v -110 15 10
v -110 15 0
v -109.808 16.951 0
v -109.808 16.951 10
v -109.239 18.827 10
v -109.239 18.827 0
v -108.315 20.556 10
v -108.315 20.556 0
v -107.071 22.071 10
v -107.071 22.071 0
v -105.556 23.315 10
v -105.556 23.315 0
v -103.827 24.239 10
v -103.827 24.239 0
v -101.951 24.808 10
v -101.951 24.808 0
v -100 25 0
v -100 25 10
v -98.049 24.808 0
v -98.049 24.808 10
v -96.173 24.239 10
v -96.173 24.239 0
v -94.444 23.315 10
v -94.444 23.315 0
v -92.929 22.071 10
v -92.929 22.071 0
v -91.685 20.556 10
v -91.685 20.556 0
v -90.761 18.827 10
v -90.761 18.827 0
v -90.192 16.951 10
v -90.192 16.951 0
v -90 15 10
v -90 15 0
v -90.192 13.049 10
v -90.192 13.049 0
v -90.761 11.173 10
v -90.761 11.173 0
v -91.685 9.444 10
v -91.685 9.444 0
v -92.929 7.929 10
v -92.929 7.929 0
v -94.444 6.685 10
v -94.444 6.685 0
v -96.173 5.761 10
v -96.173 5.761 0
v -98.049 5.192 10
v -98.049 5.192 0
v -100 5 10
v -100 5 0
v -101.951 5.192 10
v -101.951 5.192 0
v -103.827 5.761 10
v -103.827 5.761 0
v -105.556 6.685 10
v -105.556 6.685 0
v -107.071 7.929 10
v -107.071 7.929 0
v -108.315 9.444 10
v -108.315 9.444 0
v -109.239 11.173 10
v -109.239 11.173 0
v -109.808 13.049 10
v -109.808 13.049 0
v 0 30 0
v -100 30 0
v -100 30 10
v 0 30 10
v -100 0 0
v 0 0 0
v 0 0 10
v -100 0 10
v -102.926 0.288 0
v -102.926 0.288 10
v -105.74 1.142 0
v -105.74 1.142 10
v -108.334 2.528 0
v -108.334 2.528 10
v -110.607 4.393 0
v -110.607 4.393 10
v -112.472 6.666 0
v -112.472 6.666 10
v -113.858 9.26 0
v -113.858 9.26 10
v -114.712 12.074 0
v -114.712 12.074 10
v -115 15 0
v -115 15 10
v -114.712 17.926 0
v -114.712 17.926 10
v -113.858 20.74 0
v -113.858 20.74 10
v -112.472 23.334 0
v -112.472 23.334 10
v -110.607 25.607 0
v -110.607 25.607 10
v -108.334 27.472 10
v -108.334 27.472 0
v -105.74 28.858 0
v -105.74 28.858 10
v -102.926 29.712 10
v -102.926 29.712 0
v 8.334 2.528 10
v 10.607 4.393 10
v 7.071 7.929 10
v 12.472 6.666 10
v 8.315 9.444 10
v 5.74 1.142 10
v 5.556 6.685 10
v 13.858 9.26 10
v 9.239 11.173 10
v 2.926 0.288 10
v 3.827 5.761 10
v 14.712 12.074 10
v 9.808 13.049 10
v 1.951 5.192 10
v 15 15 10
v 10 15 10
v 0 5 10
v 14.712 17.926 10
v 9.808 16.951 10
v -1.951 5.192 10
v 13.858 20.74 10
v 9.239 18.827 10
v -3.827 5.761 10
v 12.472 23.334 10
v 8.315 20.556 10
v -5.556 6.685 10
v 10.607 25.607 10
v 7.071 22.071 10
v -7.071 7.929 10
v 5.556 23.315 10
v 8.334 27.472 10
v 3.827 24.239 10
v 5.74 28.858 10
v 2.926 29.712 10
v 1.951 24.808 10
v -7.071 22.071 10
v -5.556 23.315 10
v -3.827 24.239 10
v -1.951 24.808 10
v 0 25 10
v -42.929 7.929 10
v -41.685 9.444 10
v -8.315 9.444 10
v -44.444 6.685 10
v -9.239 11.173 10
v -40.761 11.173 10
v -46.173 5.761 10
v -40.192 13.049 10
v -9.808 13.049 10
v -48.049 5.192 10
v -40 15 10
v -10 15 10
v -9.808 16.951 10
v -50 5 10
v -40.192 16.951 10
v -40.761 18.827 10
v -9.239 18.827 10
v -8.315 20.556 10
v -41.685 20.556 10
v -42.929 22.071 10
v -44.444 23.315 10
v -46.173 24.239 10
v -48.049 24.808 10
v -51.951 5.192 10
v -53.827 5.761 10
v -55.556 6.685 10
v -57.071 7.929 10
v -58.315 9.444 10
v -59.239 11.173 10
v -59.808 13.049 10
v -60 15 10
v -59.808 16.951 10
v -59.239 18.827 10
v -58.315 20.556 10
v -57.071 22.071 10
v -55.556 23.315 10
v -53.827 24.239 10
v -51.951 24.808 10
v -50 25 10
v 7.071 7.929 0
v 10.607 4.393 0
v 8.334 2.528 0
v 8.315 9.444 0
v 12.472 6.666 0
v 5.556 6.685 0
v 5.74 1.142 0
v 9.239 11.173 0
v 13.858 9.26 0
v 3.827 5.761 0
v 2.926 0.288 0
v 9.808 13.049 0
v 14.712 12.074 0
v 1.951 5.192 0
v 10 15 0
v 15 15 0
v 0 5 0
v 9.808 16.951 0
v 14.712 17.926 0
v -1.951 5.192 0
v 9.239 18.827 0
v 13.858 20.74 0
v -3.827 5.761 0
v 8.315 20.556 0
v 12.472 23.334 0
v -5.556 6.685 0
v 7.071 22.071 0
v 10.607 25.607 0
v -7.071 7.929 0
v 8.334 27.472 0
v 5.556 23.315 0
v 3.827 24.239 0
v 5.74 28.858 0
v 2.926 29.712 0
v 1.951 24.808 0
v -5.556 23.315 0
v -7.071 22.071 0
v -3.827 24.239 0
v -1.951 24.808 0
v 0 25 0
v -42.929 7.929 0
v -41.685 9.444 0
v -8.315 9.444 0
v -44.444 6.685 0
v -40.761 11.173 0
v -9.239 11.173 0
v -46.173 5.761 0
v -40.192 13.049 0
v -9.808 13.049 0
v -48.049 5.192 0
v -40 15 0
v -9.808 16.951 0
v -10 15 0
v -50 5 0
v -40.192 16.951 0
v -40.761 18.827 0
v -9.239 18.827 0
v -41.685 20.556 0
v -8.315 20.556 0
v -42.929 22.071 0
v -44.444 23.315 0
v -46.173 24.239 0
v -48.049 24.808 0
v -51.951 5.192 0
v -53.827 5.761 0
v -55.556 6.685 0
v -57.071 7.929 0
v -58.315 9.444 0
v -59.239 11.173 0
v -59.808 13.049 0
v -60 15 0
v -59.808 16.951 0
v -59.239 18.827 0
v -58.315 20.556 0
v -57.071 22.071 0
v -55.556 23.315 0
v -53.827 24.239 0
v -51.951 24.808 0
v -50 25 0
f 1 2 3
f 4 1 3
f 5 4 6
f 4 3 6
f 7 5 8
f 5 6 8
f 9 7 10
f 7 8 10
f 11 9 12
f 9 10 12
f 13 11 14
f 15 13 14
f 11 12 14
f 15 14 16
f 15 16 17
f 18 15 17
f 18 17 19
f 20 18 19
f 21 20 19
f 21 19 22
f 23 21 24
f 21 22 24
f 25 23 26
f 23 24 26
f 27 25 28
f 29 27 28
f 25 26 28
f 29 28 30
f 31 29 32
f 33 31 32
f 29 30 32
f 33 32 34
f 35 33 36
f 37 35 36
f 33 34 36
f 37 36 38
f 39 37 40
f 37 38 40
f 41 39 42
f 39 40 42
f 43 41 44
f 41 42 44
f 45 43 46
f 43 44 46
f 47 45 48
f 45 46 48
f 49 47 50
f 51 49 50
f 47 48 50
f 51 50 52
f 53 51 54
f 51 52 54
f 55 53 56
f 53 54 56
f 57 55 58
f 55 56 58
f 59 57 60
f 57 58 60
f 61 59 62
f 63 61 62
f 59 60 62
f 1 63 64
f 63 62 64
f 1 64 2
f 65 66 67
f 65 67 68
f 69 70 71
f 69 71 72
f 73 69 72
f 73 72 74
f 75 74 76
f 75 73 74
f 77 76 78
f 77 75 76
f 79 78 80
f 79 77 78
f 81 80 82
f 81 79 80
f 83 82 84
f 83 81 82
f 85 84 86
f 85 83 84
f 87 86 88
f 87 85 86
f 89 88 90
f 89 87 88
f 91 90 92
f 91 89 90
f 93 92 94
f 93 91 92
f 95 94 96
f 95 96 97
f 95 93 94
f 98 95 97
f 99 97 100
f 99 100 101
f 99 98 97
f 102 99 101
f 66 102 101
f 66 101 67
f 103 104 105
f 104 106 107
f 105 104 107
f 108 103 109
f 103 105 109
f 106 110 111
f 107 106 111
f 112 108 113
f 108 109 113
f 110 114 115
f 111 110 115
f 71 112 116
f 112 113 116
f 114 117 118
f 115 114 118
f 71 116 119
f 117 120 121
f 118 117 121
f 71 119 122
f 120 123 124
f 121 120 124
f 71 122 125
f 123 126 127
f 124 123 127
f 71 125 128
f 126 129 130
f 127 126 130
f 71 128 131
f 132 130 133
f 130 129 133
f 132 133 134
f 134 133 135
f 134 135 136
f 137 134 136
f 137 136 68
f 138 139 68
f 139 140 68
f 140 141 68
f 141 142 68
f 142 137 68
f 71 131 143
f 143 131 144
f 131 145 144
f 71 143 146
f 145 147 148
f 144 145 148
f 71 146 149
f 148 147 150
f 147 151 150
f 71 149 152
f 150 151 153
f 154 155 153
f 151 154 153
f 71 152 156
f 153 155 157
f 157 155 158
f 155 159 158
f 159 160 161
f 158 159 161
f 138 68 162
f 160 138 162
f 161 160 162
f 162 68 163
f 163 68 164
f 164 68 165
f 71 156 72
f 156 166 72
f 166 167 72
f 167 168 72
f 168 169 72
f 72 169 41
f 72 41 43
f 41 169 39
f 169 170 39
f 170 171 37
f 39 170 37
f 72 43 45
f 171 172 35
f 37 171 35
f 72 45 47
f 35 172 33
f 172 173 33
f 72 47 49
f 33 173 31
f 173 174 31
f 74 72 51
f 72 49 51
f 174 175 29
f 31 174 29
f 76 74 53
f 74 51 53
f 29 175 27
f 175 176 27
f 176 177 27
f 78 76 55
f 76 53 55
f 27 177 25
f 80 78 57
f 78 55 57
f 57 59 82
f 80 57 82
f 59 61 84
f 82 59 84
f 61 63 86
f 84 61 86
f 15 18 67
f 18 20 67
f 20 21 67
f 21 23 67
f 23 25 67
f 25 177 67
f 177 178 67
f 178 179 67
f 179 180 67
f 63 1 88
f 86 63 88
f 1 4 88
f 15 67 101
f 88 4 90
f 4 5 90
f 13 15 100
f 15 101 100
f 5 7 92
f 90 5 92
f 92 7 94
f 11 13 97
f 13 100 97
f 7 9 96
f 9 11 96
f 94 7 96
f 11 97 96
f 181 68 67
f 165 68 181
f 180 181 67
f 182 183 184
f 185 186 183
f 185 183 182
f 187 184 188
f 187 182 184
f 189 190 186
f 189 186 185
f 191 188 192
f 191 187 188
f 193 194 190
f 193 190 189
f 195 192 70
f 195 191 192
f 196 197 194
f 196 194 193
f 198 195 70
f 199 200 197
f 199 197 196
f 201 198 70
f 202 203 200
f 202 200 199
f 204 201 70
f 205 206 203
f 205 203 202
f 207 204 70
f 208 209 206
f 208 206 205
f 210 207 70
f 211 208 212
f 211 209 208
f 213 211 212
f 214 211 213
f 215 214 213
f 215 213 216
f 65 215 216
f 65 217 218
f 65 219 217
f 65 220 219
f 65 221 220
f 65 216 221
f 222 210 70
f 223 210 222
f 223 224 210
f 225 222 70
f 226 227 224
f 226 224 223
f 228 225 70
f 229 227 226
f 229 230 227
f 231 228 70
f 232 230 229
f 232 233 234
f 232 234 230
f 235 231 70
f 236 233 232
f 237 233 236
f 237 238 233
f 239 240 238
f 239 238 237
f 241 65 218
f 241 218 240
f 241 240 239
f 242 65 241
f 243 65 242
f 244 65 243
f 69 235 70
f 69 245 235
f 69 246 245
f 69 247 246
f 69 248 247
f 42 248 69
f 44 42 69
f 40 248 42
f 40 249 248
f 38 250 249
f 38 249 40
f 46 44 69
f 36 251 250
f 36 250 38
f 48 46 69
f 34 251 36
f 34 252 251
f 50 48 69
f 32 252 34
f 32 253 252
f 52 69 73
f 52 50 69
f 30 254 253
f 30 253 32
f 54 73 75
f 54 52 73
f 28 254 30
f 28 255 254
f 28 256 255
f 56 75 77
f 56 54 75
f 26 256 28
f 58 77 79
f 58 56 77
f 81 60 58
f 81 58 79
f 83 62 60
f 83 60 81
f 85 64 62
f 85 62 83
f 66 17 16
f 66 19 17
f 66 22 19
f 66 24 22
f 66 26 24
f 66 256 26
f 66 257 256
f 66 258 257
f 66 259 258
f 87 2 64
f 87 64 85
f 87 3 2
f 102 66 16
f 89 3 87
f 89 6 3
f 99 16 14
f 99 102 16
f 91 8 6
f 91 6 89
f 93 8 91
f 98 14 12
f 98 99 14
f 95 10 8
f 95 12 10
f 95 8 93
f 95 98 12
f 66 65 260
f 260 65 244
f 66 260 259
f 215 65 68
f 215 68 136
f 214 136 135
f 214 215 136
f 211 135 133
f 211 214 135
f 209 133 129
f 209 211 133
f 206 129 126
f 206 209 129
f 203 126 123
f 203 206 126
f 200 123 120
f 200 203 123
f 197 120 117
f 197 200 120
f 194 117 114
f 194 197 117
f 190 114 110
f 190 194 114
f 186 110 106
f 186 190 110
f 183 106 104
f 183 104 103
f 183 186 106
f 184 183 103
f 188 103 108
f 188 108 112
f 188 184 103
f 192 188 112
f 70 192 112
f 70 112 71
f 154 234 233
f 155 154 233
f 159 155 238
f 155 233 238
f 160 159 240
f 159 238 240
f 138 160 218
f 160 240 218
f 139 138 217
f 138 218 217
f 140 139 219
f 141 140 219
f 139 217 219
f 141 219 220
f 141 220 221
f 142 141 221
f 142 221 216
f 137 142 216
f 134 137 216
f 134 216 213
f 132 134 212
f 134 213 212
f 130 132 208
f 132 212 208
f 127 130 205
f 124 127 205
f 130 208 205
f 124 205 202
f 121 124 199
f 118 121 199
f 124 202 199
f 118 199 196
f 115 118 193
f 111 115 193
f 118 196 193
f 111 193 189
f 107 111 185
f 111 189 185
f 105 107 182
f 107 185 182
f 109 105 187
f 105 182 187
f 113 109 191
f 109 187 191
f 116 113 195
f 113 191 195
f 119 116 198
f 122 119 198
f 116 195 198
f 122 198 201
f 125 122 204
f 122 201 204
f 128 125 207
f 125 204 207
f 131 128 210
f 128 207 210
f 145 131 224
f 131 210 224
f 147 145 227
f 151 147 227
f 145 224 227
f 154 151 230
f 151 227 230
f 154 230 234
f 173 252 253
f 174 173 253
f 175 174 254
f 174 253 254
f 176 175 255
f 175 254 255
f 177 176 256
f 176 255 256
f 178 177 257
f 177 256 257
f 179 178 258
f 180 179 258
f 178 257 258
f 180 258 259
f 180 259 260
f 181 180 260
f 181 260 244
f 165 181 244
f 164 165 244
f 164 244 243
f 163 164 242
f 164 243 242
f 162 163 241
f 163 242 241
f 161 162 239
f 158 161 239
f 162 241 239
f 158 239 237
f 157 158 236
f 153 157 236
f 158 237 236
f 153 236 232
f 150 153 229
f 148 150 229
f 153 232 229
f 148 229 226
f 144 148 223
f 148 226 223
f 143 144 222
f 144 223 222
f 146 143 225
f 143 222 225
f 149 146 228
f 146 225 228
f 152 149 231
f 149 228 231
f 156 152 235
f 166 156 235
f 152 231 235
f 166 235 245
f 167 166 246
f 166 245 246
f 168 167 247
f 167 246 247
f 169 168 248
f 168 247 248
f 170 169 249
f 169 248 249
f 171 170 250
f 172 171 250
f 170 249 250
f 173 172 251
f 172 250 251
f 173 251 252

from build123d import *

# Parameters (mm, degrees)
EXTRUDE_2_DEPTH     = 10
SKETCH_2_R          = 10
CUT_EXTRUDE_1_DEPTH = 10
SKETCH_3_R          = 10
CUT_EXTRUDE_2_DEPTH = 10


with BuildPart() as part:
    # Эскиз1 → Бобышка-Вытянуть2 (new body)
    with BuildSketch(Plane.XY):
        with BuildLine():
            Line((0, 0), (-100, 0))
            ThreePointArc((-100, 0), (-115, 15), (-100, 30))
            Line((-100, 30), (0, 30))
            ThreePointArc((0, 30), (15, 15), (0, 0))
        make_face()
    extrude(amount=EXTRUDE_2_DEPTH)

    # Эскиз2 → Вырез-Вытянуть1 (cut)
    with BuildSketch(Plane(origin=(0, 0, 0), x_dir=(-1, 0, 0), z_dir=(0, 0, -1))):
        with Locations((0, 15)):
            Circle(SKETCH_2_R)
        with Locations((100, 15)):
            Circle(SKETCH_2_R)
    extrude(amount=-CUT_EXTRUDE_1_DEPTH, mode=Mode.SUBTRACT)

    # Эскиз3 → Вырез-Вытянуть2 (cut)
    with BuildSketch(Plane(origin=(0, 0, 0), x_dir=(-1, 0, 0), z_dir=(0, 0, -1))):
        with Locations((50, 15)):
            Circle(SKETCH_3_R)
    extrude(amount=-CUT_EXTRUDE_2_DEPTH, mode=Mode.SUBTRACT)


solid = part.part
